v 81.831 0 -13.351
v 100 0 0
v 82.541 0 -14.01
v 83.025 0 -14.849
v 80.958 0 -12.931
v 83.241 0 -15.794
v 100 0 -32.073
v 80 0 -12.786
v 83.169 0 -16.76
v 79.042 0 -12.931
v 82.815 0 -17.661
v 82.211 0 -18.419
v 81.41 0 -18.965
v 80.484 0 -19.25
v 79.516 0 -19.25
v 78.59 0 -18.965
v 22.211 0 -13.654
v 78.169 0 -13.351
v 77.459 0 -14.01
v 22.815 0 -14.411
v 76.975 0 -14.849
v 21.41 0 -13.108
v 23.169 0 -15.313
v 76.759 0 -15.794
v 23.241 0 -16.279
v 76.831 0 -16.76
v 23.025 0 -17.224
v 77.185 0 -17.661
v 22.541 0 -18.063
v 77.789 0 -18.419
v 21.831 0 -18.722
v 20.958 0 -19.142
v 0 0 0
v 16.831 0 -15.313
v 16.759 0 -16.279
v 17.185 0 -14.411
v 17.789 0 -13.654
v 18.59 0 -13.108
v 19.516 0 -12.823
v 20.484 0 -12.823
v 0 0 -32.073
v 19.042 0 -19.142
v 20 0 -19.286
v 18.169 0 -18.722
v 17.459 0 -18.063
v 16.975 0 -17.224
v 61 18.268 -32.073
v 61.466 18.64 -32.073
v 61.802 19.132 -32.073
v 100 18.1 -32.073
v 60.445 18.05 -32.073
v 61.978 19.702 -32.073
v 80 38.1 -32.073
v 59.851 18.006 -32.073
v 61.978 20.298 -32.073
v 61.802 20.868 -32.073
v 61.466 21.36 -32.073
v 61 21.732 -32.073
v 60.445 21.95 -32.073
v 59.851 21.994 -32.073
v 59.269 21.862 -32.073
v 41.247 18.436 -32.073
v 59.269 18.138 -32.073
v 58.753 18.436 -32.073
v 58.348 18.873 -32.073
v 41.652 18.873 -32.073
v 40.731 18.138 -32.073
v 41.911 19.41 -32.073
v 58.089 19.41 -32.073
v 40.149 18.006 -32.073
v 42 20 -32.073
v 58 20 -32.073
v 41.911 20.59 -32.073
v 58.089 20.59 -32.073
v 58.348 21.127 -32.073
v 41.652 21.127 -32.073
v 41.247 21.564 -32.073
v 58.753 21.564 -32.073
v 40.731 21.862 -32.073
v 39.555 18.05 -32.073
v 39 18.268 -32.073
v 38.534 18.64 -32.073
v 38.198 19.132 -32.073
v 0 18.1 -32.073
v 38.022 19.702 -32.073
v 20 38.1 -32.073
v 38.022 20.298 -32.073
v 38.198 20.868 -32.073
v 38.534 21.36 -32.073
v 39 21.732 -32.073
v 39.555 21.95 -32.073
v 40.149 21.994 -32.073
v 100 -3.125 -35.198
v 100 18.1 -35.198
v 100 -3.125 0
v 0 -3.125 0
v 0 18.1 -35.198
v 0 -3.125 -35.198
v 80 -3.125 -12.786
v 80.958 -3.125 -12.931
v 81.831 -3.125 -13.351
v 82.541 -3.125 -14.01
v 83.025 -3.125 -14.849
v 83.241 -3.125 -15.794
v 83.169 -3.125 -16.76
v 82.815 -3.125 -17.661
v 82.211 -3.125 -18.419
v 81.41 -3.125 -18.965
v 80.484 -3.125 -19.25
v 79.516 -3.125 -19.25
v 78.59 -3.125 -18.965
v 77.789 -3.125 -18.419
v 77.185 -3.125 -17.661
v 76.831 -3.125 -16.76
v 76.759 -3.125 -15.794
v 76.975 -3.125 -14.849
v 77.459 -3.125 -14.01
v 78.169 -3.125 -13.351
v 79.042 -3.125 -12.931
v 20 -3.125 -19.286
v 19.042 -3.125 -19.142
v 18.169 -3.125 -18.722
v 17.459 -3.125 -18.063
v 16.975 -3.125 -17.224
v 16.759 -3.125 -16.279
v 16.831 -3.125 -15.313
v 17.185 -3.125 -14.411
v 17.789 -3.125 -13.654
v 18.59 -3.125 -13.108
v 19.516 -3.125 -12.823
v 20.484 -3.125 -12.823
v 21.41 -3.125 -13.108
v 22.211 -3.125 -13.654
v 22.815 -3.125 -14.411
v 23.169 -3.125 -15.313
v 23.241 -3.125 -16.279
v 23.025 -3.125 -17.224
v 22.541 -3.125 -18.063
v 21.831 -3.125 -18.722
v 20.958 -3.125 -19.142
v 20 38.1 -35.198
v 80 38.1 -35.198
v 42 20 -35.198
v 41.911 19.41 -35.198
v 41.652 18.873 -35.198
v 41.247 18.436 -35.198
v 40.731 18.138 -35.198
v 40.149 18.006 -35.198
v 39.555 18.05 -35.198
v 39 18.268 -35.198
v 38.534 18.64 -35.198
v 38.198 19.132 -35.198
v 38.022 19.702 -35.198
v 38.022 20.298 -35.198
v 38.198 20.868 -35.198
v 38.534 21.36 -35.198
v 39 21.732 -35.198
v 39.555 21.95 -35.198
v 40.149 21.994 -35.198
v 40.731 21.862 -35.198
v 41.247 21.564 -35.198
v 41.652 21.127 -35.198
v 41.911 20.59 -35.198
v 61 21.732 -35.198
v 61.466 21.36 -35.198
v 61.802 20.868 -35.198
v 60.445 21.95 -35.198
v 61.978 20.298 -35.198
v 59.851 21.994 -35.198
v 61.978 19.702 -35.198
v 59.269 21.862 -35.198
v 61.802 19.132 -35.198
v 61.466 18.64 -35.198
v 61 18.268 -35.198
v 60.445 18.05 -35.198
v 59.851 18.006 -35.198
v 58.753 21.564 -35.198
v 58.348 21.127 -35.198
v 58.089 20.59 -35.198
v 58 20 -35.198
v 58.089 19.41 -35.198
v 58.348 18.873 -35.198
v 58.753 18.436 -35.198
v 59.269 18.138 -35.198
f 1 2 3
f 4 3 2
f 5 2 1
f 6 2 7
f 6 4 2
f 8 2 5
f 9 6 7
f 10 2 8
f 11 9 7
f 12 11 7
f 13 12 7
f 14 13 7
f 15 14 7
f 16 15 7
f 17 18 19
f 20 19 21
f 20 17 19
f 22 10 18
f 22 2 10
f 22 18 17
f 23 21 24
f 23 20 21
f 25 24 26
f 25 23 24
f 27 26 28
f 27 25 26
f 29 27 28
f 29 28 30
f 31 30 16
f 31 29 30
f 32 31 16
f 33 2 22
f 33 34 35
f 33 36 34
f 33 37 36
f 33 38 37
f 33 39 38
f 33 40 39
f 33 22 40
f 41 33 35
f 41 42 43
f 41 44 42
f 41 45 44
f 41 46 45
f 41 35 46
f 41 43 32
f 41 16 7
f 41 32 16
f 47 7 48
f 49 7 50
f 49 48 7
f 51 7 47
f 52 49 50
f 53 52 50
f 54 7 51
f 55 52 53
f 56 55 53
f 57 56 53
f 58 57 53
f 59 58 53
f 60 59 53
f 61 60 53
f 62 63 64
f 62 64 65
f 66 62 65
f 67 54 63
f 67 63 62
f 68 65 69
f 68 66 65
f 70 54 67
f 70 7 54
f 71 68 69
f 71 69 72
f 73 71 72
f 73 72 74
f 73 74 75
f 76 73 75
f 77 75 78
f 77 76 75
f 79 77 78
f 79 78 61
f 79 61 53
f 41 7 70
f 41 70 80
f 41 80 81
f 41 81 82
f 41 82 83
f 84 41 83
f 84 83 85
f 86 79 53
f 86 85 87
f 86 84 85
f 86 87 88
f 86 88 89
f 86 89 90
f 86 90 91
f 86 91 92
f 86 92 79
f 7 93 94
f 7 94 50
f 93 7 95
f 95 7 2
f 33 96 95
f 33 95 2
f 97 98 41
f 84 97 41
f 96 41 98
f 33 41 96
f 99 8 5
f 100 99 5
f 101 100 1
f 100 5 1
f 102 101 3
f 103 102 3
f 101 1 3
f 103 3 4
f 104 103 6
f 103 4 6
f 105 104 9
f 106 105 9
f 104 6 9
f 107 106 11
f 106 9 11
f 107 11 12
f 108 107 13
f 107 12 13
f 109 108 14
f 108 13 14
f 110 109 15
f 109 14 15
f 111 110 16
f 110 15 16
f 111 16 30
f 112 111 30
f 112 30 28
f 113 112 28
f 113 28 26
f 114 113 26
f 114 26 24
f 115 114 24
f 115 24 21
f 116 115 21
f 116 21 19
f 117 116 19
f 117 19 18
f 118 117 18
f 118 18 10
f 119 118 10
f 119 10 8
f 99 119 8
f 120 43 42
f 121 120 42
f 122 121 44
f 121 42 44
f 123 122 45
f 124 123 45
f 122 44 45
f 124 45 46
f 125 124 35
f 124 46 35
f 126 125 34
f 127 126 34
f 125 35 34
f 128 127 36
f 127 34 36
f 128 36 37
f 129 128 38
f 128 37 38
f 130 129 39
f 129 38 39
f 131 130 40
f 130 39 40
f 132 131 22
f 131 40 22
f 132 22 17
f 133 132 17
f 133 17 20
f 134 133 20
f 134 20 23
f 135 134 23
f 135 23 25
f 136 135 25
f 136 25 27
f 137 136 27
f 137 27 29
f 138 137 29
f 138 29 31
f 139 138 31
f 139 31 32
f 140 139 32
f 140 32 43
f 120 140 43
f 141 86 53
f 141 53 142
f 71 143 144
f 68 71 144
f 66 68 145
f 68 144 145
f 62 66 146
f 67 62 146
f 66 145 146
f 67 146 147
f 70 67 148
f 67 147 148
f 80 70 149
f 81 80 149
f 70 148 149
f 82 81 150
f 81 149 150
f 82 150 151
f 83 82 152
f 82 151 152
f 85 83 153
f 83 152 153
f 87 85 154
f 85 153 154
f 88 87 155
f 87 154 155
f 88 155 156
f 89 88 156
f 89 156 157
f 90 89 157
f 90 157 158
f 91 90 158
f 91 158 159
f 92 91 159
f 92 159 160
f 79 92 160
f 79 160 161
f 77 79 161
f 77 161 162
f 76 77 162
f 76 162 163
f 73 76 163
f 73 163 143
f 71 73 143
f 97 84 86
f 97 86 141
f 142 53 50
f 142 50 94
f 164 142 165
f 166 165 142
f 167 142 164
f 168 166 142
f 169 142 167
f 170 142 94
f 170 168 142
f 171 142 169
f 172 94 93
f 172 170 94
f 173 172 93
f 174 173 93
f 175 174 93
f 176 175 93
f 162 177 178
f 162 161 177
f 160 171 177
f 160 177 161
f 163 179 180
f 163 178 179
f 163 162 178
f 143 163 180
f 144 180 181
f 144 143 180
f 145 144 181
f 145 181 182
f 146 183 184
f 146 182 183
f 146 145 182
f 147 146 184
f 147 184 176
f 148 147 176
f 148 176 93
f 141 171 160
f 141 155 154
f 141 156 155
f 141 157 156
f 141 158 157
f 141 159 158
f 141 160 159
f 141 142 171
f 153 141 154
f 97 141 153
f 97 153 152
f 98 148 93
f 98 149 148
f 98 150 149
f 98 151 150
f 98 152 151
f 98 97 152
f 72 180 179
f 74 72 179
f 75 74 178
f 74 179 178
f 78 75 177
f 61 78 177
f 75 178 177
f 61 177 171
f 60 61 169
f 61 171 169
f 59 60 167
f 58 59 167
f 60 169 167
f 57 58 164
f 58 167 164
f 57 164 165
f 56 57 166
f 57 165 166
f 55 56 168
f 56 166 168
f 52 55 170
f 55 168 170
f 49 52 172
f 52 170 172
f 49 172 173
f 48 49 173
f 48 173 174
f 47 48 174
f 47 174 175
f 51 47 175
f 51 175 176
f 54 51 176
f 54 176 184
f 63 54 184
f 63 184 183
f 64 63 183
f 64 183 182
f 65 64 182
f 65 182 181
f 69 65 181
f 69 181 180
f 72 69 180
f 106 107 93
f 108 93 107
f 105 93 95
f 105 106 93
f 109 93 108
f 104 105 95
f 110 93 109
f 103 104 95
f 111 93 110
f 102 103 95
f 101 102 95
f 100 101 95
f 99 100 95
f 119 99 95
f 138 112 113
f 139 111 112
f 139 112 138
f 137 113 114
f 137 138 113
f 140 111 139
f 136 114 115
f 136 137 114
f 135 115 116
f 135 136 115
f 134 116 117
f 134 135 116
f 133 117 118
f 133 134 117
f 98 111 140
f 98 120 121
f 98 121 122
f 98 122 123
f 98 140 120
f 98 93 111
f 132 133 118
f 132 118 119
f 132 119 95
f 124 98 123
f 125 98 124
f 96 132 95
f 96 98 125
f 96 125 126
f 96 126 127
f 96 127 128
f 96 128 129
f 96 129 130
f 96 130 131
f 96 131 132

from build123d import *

# Parameters (mm, degrees)
EXTRUDE_THIN1_DEPTH = 100
SKETCH2_R           = 2
CUT_EXTRUDE1_DEPTH  = 36.197996578
CHAMFER1_SIZE       = 20
SKETCH3_R           = 3.25
CUT_EXTRUDE2_DEPTH  = 4.125


with BuildPart() as part:
    # Sketch1 → Extrude-Thin1 (new body)
    with BuildSketch(Plane(origin=(0, 0, 0), x_dir=(0, 0, -1), z_dir=(1, 0, 0))):
        Polygon((0, 0), (32.072996578, 0), (32.072996578, 38.1), (35.197996578, 38.1), (35.197996578, -3.125), (0, -3.125), align=None)
    extrude(amount=EXTRUDE_THIN1_DEPTH)

    # Sketch2 → Cut-Extrude1 (cut, through all)
    with BuildSketch(Plane(origin=(0, 0, -35.197996578), x_dir=(-1, 0, 0), z_dir=(0, 0, -1))):
        with Locations(Location((-40, 20, 0), (0, 0, 180))):  # turned: the seam where the file's is
            Circle(SKETCH2_R)
        with Locations((-60, 20)):
            Circle(SKETCH2_R)
    extrude(amount=-CUT_EXTRUDE1_DEPTH, mode=Mode.SUBTRACT)

    # Chamfer1
    chamfer1_edges = [part.edges().sort_by_distance(p)[0] for p in [
        (0, 38.1, -33.635496578),
        (100, 38.1, -33.635496578),
    ]]
    chamfer(chamfer1_edges, length=CHAMFER1_SIZE)

    # Sketch3 → Cut-Extrude2 (cut, through all)
    with BuildSketch(Plane(origin=(0, 0, 0), x_dir=(-1, 0, 0), z_dir=(0, 1, 0))):
        with Locations(Location((-80, -16.036498289, 0), (0, 0, 90))):  # turned: the seam where the file's is
            Circle(SKETCH3_R)
        with Locations(Location((-20, -16.036498289, 0), (0, 0, 270))):  # turned: the seam where the file's is
            Circle(SKETCH3_R)
    extrude(amount=-CUT_EXTRUDE2_DEPTH, mode=Mode.SUBTRACT)


solid = part.part
